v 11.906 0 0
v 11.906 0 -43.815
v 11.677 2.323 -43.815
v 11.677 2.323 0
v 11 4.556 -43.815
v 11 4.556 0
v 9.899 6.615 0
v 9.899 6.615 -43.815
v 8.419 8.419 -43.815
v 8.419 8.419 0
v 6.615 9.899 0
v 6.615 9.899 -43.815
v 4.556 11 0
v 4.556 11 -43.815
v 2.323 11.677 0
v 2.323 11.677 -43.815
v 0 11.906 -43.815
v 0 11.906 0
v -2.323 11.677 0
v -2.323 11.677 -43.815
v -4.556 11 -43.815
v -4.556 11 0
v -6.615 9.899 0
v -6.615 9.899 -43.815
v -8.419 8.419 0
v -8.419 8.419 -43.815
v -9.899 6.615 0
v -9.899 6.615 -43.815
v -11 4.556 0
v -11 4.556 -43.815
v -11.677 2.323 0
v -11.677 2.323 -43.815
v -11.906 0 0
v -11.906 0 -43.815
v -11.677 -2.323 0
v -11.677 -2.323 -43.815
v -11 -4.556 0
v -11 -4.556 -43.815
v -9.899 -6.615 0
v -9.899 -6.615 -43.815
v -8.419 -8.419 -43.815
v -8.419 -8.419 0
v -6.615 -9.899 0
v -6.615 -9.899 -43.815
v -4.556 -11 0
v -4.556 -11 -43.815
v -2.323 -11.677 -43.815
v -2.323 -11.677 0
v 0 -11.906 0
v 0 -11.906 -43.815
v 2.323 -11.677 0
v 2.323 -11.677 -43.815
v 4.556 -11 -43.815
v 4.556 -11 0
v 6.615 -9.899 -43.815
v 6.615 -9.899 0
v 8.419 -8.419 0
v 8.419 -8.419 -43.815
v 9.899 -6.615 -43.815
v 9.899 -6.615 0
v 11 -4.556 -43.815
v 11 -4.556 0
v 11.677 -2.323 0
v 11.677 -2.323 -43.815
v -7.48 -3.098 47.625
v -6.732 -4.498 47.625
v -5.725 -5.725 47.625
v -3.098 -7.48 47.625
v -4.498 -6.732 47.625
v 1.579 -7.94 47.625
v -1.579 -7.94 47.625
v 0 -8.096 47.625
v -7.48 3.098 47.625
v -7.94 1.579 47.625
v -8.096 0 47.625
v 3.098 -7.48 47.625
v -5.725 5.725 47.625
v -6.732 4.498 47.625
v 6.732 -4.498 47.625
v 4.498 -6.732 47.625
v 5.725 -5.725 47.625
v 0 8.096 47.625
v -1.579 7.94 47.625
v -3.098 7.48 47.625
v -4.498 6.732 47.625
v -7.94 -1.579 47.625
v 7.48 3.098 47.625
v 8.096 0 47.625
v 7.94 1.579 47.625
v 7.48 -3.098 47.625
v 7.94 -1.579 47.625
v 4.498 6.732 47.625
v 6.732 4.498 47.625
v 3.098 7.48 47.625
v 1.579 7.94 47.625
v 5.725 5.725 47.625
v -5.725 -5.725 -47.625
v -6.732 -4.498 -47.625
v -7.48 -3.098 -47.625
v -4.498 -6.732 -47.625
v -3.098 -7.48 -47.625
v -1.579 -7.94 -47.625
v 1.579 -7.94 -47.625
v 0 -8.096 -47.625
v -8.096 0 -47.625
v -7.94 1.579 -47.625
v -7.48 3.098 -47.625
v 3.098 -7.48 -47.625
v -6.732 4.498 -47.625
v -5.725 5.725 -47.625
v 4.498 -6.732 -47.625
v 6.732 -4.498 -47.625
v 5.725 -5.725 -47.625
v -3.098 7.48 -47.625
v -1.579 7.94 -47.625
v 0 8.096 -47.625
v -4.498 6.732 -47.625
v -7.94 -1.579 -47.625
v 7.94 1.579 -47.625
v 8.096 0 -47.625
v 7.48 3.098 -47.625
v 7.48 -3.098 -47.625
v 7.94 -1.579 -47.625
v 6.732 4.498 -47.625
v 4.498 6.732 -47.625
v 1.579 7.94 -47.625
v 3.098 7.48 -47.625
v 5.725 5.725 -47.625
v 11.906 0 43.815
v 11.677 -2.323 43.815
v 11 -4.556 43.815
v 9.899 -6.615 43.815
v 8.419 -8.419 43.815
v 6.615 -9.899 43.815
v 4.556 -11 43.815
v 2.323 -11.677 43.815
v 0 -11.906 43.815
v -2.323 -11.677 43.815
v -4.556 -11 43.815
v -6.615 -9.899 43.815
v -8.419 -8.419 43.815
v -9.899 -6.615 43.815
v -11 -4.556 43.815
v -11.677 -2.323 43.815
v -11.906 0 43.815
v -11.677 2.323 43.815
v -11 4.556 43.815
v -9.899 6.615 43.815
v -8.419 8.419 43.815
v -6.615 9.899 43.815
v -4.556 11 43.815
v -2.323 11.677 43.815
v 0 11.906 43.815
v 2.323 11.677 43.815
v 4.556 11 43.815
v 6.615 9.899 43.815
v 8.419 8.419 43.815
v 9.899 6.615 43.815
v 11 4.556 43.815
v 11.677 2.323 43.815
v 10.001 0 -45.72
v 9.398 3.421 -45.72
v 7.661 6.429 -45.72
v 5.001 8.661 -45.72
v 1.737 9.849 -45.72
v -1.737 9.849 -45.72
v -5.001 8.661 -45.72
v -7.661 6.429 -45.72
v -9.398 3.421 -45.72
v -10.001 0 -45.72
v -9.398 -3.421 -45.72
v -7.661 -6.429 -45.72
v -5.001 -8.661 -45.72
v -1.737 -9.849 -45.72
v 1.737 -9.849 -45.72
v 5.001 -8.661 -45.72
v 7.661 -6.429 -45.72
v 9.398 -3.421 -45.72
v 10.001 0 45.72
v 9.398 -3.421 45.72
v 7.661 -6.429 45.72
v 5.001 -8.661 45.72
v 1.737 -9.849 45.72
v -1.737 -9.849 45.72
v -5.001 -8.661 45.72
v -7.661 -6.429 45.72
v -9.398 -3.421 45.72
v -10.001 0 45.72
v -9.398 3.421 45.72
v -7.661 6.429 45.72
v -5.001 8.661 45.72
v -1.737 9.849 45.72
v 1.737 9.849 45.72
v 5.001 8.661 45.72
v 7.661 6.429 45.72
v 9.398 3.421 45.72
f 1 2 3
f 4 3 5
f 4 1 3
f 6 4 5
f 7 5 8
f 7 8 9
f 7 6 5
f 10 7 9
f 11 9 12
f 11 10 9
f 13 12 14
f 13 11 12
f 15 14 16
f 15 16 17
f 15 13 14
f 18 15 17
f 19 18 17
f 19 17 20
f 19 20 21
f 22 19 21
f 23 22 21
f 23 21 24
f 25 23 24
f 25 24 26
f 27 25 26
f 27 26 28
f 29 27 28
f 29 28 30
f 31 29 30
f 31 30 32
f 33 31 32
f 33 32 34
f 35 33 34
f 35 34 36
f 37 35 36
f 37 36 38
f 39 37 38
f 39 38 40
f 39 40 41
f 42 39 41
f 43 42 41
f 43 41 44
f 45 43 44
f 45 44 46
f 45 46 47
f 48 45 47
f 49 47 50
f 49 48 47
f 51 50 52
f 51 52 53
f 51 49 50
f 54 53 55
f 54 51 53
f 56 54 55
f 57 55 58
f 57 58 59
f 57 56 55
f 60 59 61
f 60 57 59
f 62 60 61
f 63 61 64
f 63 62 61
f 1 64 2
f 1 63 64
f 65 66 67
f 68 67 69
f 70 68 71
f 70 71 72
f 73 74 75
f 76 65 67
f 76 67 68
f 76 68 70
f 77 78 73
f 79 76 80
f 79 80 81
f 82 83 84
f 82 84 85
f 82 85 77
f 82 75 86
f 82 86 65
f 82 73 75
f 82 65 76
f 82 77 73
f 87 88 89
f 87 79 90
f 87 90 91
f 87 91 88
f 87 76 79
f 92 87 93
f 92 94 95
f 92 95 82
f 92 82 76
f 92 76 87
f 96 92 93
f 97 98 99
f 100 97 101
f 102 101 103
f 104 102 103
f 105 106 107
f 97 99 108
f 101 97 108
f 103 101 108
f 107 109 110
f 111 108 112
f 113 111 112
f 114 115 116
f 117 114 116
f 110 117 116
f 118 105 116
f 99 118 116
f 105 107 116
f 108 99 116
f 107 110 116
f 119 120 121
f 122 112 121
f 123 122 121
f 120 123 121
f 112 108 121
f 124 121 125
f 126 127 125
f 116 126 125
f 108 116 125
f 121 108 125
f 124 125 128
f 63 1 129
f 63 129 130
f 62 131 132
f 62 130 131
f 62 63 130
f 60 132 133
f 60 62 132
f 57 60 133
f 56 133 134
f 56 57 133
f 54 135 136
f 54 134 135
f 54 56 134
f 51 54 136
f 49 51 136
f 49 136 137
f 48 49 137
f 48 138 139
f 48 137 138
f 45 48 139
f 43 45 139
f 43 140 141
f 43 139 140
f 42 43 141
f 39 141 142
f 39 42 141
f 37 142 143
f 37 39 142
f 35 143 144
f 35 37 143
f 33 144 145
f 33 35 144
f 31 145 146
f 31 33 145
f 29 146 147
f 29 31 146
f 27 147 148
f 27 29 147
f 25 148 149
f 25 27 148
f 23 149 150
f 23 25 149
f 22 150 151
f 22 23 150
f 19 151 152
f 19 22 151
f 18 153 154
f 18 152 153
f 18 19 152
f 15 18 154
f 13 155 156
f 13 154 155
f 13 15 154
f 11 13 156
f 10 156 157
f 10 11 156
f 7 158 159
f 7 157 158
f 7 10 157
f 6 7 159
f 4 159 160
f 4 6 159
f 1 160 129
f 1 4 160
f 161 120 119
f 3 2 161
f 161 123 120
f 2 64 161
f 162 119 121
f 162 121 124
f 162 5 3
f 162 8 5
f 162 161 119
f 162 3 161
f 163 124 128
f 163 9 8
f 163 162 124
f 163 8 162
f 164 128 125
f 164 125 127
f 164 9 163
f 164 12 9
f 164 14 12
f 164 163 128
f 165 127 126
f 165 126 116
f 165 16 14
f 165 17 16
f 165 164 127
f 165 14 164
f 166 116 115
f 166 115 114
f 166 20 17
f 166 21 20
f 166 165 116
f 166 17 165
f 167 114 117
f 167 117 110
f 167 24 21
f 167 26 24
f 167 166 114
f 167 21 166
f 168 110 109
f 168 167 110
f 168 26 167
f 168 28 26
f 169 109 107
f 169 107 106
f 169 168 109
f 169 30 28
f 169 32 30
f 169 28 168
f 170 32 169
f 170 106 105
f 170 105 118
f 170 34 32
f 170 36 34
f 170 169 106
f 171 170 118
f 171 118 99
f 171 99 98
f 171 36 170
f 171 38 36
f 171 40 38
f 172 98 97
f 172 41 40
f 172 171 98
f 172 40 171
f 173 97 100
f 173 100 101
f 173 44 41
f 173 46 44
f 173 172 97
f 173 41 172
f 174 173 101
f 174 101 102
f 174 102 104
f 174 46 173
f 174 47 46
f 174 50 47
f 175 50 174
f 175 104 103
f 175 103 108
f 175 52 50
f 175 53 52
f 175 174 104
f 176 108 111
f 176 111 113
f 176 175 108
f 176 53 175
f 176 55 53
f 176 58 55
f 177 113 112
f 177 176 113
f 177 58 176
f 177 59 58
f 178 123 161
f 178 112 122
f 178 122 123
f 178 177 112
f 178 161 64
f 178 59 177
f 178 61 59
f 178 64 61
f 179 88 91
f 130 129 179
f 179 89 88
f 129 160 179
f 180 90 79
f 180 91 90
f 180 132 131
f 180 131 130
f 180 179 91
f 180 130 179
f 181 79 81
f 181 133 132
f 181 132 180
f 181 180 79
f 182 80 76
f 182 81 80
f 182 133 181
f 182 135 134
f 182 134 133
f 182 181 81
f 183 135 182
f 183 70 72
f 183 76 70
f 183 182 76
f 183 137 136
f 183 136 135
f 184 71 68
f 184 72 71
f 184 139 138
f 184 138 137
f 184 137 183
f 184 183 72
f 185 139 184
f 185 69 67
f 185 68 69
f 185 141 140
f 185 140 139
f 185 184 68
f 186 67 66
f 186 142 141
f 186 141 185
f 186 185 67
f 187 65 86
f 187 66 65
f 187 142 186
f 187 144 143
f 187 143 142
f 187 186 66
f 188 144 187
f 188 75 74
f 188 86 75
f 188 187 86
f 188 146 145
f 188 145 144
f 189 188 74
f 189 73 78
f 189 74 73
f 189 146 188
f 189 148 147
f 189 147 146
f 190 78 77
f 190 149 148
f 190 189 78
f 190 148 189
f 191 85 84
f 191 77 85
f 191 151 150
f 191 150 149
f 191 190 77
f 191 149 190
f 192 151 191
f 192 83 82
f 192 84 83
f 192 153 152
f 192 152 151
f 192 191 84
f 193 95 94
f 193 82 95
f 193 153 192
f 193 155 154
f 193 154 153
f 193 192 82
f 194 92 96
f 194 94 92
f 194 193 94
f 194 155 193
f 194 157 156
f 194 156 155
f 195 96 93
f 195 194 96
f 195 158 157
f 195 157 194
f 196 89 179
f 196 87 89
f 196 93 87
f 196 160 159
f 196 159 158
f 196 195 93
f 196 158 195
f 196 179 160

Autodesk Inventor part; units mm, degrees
ref_plane "YZ Plane" through (0, 0, 0) normal (1, 0, 0) x (0, 1, 0)
ref_plane "XZ Plane" through (0, 0, 0) normal (0, 1, 0) x (-1, 0, 0)
ref_plane "XY Plane" through (0, 0, 0) normal (0, 0, 1) x (1, 0, 0)
sketch "Sketch1" plane through (0, 0, 0) normal (0, 0, 1) x (1, 0, 0)
  circle A0 centre (0, 0) radius 1.1906
  dimension "d0" = 2.3813
extrude "Extrusion1" add sketch "Sketch1" along normal mid plane 9.525
chamfer "Chamfer1" distance 0.381 angle 45 2 edges at (-1.1906, 0, -4.7625) (-1.1906, 0, 4.7625)
scale "Scale1" factors (10, 10, 10) then translate (0, 0, 0) bodies 1
properties part number "hex axle pin"
